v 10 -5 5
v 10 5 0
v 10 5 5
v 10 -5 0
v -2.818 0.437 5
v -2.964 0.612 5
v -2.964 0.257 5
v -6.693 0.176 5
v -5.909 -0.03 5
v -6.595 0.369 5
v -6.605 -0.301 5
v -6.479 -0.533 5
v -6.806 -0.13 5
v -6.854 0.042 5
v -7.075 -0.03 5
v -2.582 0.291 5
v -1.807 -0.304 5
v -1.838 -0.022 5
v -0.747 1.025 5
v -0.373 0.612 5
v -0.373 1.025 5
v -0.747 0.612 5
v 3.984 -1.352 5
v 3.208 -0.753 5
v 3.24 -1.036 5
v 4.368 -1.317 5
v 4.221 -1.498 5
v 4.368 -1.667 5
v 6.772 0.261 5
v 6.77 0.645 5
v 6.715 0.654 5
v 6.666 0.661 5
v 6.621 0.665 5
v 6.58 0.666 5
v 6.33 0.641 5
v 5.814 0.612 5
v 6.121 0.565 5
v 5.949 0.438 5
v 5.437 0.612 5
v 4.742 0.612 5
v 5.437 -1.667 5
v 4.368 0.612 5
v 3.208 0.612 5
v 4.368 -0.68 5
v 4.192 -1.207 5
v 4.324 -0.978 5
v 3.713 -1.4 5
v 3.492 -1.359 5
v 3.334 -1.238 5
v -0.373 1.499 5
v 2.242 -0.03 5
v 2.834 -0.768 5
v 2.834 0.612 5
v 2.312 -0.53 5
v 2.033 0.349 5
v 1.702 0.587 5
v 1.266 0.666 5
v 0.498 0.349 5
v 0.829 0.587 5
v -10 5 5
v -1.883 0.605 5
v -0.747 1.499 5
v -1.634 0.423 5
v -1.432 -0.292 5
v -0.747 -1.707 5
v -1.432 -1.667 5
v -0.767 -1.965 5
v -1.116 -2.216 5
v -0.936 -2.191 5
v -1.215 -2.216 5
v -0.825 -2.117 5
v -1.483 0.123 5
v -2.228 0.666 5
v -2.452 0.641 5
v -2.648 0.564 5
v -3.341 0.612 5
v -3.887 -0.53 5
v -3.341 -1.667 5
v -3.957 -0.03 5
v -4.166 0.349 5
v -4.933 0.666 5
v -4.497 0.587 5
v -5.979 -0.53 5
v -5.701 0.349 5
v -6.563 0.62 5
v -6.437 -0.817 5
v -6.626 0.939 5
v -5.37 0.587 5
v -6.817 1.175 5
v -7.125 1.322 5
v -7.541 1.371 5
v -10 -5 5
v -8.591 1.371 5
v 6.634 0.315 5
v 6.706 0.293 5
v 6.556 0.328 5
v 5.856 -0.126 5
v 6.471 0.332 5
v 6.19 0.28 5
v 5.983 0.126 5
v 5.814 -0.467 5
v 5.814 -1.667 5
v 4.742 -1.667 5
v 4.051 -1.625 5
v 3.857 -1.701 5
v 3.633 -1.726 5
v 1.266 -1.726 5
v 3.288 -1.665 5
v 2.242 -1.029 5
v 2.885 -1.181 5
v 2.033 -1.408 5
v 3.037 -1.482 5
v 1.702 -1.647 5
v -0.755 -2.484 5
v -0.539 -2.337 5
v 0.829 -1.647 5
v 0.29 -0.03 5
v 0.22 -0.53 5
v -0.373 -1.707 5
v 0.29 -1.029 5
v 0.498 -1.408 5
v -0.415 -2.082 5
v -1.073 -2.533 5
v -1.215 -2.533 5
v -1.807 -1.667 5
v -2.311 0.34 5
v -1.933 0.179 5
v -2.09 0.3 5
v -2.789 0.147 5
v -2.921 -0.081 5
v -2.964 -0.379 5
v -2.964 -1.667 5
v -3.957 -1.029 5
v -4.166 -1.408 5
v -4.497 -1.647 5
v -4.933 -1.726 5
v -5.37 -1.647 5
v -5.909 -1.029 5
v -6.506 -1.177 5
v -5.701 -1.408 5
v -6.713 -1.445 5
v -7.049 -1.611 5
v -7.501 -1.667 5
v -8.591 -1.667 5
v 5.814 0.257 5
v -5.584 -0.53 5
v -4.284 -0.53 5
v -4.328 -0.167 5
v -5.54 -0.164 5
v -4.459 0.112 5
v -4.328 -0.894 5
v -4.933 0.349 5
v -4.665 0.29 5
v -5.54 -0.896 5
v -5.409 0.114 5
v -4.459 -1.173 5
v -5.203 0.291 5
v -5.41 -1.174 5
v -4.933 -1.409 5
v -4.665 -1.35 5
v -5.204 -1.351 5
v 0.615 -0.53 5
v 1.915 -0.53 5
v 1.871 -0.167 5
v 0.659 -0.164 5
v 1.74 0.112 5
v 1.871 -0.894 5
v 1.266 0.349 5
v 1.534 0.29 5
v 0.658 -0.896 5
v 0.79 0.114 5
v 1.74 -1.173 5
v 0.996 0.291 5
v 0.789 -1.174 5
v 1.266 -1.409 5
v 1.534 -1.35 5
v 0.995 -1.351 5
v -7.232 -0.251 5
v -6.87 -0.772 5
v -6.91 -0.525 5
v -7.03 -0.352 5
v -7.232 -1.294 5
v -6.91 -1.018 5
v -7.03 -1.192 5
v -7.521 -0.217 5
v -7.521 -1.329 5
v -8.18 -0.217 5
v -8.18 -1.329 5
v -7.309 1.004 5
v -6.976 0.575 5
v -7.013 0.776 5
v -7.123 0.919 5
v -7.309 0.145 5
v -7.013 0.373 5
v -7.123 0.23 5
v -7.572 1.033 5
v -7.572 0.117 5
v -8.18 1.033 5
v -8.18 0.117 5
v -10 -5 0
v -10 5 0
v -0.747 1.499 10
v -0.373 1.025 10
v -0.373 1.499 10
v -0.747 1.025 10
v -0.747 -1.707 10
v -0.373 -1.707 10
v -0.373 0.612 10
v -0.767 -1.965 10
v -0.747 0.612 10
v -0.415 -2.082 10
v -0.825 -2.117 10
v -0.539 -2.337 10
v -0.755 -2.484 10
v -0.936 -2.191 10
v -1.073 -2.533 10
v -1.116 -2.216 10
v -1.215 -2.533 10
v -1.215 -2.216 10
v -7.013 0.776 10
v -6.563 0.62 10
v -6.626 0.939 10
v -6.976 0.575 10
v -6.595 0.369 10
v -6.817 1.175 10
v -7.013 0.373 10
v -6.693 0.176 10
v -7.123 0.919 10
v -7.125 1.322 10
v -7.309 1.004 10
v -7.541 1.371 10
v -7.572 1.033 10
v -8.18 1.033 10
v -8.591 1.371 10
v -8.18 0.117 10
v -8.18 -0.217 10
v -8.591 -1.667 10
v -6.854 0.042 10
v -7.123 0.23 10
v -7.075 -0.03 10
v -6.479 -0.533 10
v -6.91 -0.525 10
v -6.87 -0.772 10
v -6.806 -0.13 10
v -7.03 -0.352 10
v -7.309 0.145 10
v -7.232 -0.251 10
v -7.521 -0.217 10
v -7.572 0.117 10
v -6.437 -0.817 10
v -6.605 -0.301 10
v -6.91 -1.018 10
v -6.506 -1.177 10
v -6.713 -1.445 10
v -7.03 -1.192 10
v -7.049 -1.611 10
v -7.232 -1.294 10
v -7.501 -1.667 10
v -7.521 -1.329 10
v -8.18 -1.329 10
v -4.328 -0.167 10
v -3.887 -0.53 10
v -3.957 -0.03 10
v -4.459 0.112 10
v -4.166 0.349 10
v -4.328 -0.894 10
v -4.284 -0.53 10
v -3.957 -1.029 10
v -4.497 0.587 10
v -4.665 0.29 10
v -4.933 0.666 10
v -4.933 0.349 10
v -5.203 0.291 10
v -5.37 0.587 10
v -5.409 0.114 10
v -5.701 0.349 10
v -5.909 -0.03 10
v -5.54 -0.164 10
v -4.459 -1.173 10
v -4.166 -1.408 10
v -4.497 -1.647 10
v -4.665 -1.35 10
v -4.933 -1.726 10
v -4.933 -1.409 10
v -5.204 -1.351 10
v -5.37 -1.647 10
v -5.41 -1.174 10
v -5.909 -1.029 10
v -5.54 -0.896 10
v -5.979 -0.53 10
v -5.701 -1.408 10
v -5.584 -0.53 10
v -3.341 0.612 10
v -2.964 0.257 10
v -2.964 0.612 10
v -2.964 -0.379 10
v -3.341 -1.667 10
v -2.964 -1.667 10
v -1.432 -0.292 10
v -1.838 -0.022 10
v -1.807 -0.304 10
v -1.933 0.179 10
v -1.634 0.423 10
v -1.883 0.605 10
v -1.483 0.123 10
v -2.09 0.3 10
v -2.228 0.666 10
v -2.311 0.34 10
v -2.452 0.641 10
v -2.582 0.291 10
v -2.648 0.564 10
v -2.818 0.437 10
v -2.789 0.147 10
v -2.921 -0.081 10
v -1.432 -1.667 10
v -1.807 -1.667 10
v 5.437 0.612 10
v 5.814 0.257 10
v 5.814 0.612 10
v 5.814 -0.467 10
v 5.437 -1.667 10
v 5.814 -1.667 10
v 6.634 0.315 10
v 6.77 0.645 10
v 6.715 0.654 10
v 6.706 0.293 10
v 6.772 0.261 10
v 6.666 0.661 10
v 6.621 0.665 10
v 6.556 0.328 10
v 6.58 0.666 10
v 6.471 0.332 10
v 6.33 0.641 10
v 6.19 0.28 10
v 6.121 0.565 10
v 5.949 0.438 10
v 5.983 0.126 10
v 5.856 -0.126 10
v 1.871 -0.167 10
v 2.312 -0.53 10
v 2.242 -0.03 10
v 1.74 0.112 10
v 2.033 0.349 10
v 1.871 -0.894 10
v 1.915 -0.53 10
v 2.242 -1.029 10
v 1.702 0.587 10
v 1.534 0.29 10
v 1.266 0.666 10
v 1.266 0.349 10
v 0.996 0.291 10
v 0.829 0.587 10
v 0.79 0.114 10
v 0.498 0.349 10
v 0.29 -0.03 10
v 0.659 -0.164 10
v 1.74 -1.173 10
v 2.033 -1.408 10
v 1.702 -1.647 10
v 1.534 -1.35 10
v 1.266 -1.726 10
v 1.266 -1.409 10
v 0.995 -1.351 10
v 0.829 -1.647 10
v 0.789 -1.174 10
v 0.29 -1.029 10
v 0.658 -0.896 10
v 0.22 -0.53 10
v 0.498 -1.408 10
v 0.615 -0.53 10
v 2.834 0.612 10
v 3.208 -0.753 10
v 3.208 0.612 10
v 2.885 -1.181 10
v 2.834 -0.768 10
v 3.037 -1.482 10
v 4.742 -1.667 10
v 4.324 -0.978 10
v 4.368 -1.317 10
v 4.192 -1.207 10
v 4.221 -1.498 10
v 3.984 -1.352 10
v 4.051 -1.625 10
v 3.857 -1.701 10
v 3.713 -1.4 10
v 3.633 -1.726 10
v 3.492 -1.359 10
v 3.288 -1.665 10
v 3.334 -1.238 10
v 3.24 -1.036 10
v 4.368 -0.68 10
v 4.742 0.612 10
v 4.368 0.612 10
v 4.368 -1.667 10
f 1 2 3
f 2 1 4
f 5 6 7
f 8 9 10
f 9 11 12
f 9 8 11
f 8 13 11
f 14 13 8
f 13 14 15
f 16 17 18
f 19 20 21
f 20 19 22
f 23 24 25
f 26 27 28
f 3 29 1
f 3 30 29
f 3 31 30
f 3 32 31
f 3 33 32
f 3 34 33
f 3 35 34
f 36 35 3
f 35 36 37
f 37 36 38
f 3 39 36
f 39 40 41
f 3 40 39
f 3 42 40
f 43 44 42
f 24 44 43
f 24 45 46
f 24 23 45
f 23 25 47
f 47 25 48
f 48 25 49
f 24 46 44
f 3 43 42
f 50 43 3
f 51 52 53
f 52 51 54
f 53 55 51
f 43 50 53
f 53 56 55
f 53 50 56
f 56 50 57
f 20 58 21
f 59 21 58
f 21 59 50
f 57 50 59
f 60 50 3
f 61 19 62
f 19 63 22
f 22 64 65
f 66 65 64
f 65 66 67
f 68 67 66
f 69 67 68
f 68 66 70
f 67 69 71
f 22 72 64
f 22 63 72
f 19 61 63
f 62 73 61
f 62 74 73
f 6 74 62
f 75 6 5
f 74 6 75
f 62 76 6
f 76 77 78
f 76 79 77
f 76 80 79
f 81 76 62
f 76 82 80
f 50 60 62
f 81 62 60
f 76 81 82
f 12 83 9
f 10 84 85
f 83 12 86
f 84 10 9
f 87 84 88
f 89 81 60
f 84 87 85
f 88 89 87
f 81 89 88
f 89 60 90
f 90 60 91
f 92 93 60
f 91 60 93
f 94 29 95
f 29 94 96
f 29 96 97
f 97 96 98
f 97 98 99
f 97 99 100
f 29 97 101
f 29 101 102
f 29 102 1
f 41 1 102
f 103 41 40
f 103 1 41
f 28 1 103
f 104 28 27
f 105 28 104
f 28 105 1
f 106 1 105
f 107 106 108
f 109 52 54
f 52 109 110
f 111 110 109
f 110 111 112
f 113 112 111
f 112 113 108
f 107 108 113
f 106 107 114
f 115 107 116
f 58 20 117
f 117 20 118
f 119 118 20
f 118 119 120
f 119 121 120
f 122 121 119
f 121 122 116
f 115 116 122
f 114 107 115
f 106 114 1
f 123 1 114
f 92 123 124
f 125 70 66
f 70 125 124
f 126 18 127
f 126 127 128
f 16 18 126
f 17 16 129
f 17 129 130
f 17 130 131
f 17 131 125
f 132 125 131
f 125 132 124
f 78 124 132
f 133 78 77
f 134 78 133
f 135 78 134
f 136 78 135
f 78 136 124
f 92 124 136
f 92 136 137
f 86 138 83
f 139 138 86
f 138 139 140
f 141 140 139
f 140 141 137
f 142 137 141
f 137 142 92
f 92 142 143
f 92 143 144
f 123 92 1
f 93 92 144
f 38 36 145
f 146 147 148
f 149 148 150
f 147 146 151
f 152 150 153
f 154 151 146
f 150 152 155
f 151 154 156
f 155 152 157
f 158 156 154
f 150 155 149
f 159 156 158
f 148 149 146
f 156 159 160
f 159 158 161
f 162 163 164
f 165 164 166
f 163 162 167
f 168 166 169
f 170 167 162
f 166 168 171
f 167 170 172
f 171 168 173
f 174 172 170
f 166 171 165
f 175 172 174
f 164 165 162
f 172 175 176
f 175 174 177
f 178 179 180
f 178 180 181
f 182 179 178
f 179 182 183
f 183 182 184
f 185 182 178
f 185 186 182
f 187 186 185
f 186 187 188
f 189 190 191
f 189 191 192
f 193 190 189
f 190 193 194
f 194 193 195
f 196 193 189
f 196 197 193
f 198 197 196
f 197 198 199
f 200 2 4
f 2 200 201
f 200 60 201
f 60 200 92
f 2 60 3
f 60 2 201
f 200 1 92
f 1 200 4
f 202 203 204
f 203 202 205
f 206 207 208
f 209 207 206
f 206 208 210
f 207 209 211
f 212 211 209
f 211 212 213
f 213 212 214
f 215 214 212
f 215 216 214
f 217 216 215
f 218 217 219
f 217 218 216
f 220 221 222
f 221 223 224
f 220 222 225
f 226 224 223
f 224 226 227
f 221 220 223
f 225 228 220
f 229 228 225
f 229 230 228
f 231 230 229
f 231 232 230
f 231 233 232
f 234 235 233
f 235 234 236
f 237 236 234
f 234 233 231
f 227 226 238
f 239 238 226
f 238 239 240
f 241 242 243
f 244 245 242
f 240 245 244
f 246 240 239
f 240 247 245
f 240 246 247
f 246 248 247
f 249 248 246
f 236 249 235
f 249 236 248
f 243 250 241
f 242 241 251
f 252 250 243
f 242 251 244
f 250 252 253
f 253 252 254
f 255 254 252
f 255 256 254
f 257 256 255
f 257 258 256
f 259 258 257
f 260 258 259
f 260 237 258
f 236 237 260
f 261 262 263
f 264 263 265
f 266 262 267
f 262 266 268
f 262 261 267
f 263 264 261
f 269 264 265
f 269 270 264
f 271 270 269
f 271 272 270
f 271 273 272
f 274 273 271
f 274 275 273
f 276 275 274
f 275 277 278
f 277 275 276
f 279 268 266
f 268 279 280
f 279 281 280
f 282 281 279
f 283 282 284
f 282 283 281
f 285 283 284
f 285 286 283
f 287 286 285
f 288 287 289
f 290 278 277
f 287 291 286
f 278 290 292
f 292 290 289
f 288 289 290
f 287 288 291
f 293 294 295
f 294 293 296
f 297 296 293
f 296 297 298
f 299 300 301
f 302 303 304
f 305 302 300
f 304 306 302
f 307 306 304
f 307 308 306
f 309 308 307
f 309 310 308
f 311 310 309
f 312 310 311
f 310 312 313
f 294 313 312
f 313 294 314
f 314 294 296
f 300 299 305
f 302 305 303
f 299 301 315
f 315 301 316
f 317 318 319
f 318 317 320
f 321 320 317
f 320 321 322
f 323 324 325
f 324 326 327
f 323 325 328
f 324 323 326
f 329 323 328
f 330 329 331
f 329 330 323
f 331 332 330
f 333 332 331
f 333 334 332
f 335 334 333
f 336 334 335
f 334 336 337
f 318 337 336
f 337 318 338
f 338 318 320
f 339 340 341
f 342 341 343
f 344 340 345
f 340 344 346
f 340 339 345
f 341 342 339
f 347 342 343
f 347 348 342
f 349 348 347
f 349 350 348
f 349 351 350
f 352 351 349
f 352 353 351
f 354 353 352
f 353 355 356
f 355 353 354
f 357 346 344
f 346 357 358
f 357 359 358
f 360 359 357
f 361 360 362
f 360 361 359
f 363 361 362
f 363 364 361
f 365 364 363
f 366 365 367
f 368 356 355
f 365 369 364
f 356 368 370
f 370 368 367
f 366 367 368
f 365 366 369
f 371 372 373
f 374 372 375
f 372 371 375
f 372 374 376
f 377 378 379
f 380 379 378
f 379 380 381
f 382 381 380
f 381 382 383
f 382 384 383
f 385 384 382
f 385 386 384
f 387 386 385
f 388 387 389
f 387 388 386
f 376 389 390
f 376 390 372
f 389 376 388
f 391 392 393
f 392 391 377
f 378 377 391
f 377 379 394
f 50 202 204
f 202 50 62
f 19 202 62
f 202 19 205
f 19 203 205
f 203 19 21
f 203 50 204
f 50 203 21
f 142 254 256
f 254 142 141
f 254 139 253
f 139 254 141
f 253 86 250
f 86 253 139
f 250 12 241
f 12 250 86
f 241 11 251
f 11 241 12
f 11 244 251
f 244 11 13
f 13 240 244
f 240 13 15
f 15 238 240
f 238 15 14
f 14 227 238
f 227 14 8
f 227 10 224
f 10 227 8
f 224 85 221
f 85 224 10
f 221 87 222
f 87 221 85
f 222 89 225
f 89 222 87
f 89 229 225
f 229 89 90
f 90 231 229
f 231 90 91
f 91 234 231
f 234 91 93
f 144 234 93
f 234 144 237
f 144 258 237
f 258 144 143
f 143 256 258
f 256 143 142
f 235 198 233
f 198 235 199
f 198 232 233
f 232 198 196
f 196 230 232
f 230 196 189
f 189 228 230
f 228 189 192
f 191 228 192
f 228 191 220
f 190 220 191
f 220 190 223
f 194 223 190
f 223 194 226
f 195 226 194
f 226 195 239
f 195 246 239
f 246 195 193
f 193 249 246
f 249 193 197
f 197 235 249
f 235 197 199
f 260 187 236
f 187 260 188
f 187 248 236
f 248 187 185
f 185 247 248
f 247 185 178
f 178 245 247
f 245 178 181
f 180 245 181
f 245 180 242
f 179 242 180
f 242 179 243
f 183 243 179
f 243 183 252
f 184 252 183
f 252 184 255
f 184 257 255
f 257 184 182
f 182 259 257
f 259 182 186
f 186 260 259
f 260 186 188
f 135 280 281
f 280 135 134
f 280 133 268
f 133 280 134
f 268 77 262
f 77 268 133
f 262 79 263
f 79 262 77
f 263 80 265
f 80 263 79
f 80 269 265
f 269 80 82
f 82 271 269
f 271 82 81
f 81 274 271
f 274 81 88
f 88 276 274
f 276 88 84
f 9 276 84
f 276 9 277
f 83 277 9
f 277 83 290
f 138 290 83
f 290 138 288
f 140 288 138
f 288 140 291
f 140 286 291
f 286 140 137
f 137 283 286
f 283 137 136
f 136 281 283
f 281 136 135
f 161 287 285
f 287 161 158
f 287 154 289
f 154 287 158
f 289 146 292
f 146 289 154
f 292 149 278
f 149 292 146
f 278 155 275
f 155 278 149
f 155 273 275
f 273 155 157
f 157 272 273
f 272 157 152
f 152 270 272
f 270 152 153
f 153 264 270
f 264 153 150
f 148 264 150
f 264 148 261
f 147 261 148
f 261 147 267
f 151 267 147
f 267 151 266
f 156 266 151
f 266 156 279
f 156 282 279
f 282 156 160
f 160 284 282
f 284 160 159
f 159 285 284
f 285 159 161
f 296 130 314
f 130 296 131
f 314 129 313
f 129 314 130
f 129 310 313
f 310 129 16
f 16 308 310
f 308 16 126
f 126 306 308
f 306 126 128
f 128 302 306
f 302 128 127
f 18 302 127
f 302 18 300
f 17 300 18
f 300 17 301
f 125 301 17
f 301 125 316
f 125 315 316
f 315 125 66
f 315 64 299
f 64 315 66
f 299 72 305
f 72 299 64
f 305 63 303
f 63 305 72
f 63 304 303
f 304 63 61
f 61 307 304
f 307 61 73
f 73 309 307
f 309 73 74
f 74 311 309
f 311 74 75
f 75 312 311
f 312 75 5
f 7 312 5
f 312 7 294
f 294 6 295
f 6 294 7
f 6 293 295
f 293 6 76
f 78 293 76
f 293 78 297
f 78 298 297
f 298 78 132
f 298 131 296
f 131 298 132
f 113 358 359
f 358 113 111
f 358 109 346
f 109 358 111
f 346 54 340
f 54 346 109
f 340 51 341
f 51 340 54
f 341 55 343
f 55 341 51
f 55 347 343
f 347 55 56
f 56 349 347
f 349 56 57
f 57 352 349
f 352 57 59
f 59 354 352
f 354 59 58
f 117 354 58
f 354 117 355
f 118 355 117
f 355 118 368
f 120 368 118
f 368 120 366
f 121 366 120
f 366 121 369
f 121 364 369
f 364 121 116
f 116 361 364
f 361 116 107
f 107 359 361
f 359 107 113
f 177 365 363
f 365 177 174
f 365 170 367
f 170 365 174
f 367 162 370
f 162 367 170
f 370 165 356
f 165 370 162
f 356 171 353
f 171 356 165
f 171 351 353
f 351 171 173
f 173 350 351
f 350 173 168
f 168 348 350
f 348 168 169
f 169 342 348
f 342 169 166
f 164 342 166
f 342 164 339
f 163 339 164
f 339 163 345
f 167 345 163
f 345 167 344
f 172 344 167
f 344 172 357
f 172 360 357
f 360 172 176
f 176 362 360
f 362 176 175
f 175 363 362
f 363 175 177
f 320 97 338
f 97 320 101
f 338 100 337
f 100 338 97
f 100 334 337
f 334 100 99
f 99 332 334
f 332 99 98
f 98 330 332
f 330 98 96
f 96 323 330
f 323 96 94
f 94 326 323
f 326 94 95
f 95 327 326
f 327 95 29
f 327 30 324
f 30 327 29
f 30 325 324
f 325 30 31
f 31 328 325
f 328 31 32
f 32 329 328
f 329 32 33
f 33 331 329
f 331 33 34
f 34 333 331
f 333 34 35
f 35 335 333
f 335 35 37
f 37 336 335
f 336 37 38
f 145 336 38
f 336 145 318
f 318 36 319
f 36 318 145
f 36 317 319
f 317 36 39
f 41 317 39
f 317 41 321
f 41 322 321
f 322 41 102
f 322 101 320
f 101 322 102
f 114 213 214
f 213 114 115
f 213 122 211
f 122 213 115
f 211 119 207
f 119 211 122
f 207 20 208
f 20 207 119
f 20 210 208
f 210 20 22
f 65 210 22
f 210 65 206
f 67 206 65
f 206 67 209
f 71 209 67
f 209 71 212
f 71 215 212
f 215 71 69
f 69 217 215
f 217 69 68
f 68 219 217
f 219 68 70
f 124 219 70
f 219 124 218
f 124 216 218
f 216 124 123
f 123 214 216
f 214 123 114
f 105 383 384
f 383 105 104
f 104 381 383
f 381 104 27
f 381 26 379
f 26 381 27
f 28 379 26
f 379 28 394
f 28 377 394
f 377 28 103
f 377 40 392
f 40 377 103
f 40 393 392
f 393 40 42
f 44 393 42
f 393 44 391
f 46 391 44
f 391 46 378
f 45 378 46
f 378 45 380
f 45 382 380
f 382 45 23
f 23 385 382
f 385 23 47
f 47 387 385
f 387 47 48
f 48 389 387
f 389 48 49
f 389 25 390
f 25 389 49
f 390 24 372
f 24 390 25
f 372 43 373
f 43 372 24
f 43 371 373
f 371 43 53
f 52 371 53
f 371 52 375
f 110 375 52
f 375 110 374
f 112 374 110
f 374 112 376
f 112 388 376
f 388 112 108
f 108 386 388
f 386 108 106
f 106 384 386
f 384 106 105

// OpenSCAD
$fn = 10; 
texte_a_inserer = "Bonjour"; 
taille = 3; 
police = "DejaVuSans"; //[[Abril Fatface,Aclonica,Acme,Advent Pro,Akronim,Aladin,Alegreya,Alegreya Sans,Alegreya SC,Alex Brush,Alfa Slab One,Alice,Amaranth,Architects Daughter,Archivo Black,Archivo Narrow,Arimo,Arvo,Asap,Astloch,Asul,Averia Libre,Averia Serif Libre,Bangers,Basic,Belgrano,Berkshire Swash,Bigshot One,Bilbo Swash Caps,Black Ops One,Bonbon,Bowlby One SC,Brawler,Bubblegum Sans,Butterfly Kids,Cabin Condensed,Caesar Dressing,Cagliostro,Calligraffitti,Capriola,Carter One,Changa One,Chango,Chelsea Market,Cherry Cream Soda,Chewy,Chicle,Chivo,Clicker Script,Coming Soon,Concert One,Condiment,Cookie,Courgette,Covered By Your Grace,Crimson Text,Dancing Script,DejaVu Sans,DejaVu Serif,Dhurjati,Doppio One,Dosis,Droid Sans,Eagle Lake,Electrolize,Emilys Candy,Encode Sans,Encode Sans Compressed,Euphoria Script,Exo,Exo 2,Faster One,Federo,Finger Paint,Fjord One,Fontdiner Swanky,Freckle Face,Fruktur,Gabriela,Geo,Germania One,Give You Glory,Gloria Hallelujah,Goudy Bookletter 1911,Graduate,Grand Hotel,Great Vibes,Griffy,Hanalei Fill,Happy Monkey,Henny Penny,Hind,IM Fell English SC,Indie Flower,Irish Grover,Italianno,Jacques Francois Shadow,Jolly Lodger,Josefin Slab,Joti One,Judson,Just Another Hand,Kalam,Kameron,Karma,Kavoon,Knewave,Kranky,Kristi,Laila,Lakki Reddy,Lancelot,Lato,Leckerli One,Ledger,Lekton,Lemon One,Liberation Sans,Libre Caslon Text,Life Savers,Lilita One,Lily Script One,Limelight,Lobster,Lobster Two,Londrina Outline,Londrina Shadow,Londrina Solid,Lora,Love Ya Like A Sister,Loved by the King,Lovers Quarrel,Luckiest Guy,Lusitana,Macondo,Macondo Swash Caps,Mako,Marck Script,Margarine,Marko One,Maven Pro,McLaren,MedievalSharp,Merienda One,Merriweather,Mervale Script,Metal Mania,Metrophobic,Milonga,Miltonian Tattoo,Miss Fajardose,Molle,Montez,Montserrat,Mr De Haviland,Mystery Quest,Neucha,New Rocker,Niconne,Nosifer,Nothing You Could Do,Noto Sans Oriya,Noto Serif,Nova Square,Nunito,Old Standard TT,Oleo Script,Oleo Script Swash Caps,Orbitron,Oregano,Orienta,Original Surfer,Oswald,Over the Rainbow,Overlock,Oxygen,Pacifico,Paprika,Parisienne,Patrick Hand SC,Paytone One,Peralta,Permanent Marker,Piedra,Pirata One,Play,Playball,Poetsen One,Poppins,Press Start 2P,Princess Sofia,PT Mono,Qwigley,Racing Sans One,Raleway,Rancho,Ranga,Ribeye,Roboto,Roboto Condensed,Roboto Slab,Rochester,Rock Salt,Rubik One,Sail,Salsa,Sansita One,Sarina,Satisfy,Schoolbell,Seaweed Script,Sevillana,Shadows Into Light,Shadows Into Light Two,Share,Six Caps,Skranji,Source Sans Pro,Spicy Rice,Stardos Stencil,Stoke,Syncopate,Teko,Terminal Dosis,The Girl Next Door,Tillana,Timmana,Titillium Web,Ubuntu,Ultra,Underdog,UnifrakturCook,UnifrakturMaguntia,Vampiro One,Vidaloka,Viga,Voces,Volkhov,Vollkorn,Voltaire,Waiting for the Sunrise,Wallpoet,Wellfleet,Wendy One,Yellowtail,Yesteryear,Zeyada]]
hauteur = 5; 
longueur_cube = 20; 
largeur_cube = 10; 
hauteur_cube = 5; 
// relief = relief  extrusion = extru
relief = "relief"; //[relief,extru]
module rendu(){
linear_extrude(hauteur) text(texte_a_inserer,size = taille, font = police);
}
module finao(){
if ( relief== "relief") {
   union(){
 translate([0,0,0])   cube([longueur_cube,largeur_cube,hauteur_cube]);
translate([1,(largeur_cube/3),hauteur_cube]) rendu();
   } 
}
else
{
difference(){
 translate([0,0,0])   cube([longueur_cube,largeur_cube,hauteur_cube]);
translate([1,(largeur_cube/3),(hauteur_cube -hauteur+0.1)]) rendu();
}
 }
}
translate ([-(longueur_cube/2),-(largeur_cube/2),0]) finao();
